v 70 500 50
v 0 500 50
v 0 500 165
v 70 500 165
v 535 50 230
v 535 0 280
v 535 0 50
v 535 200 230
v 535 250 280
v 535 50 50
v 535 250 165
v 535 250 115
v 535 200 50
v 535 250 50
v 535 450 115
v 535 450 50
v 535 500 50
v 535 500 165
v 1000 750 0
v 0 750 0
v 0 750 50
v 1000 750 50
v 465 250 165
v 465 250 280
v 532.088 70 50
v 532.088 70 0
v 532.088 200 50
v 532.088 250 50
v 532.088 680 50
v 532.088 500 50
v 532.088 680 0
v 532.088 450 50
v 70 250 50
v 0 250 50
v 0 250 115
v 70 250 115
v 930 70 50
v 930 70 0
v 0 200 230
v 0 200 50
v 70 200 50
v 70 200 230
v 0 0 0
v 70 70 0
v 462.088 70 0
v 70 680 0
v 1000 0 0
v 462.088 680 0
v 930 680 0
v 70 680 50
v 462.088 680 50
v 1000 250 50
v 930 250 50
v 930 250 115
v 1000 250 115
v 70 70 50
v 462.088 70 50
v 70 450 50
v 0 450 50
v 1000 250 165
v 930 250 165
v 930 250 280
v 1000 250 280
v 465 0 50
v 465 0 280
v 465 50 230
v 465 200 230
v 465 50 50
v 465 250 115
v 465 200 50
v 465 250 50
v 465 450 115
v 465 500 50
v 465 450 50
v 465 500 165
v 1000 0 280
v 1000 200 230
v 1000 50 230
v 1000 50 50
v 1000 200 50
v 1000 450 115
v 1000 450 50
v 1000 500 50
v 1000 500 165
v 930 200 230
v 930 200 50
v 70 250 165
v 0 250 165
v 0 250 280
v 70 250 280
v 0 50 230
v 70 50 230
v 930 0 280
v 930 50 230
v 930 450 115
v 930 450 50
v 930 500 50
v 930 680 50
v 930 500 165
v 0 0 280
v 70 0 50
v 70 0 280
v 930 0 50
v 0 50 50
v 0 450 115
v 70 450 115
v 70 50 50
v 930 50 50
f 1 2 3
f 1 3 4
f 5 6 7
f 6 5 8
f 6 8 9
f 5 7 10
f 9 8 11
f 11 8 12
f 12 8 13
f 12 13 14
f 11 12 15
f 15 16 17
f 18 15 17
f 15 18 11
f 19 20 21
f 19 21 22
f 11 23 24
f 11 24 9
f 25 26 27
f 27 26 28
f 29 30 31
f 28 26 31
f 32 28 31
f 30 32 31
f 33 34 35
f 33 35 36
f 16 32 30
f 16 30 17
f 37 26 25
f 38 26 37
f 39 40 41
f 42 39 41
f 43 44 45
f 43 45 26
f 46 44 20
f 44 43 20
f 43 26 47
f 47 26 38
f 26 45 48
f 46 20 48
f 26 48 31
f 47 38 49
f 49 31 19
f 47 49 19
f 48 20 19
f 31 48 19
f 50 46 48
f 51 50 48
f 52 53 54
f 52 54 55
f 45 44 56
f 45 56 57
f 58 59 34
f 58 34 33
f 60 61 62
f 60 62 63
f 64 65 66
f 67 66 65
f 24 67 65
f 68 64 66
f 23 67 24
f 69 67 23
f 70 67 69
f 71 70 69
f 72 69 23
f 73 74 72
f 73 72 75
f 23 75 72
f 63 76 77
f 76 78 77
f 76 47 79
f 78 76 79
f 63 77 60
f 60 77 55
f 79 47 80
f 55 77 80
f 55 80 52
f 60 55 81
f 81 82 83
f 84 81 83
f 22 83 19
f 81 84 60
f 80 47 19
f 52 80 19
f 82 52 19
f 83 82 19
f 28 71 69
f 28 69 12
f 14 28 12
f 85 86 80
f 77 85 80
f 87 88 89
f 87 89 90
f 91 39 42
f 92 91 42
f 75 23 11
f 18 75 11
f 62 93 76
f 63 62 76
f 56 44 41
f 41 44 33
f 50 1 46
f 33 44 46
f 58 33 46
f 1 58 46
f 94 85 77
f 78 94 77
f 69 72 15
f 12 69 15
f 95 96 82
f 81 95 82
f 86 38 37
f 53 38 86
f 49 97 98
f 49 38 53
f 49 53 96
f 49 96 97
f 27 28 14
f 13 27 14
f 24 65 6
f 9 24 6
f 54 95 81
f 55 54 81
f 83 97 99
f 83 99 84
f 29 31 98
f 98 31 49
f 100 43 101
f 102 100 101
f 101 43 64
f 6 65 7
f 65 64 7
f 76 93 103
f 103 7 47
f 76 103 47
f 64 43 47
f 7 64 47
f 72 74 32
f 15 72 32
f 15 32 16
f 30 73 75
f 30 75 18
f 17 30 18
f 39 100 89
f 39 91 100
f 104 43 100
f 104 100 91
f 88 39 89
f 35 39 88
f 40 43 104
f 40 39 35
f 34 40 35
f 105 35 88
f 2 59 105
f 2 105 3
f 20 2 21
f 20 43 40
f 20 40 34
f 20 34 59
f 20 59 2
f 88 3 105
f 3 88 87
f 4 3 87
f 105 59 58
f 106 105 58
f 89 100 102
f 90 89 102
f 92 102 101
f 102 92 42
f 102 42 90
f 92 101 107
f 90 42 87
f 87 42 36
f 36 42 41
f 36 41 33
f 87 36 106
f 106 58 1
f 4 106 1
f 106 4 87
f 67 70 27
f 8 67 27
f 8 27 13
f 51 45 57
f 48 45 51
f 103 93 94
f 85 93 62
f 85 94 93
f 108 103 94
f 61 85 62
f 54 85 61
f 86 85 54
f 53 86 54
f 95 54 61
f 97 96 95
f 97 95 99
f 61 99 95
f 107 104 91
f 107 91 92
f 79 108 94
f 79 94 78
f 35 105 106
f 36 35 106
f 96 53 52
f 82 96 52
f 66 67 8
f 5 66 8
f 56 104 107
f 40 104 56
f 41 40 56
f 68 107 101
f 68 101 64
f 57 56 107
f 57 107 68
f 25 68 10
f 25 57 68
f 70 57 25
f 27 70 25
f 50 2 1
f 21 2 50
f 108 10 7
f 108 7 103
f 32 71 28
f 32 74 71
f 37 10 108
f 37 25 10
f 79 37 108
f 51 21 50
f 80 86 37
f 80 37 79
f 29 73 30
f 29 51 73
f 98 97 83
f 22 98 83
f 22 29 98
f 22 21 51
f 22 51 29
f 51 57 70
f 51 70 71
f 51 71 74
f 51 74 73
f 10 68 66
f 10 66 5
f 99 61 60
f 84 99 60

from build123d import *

# Parameters (mm, degrees)
SKETCH_W                   = 1000
SKETCH_H                   = 750
SKETCH_W_2                 = 392.088353
SKETCH_H_2                 = 610
SKETCH_W_3                 = 397.911647
PAD_DEPTH                  = 50
SKETCH001_W                = 70
SKETCH001_H                = 50
PAD001_DEPTH               = 180
SKETCH001_MIRRORED001_2_W  = 70
SKETCH001_MIRRORED001_2_H  = 50
PAD001_MIRRORED001_2_DEPTH = 180
LINEARPATTERN_COUNT        = 3
LINEARPATTERN_PITCH        = 465
SKETCH002_W                = 70
SKETCH002_H                = 50
PAD002_DEPTH               = 65
SKETCH003_W                = 70
SKETCH003_H                = 250
PAD003_DEPTH               = 50
LINEARPATTERN001_COUNT     = 3
LINEARPATTERN001_PITCH     = 465
LINEARPATTERN002_COUNT     = 3
LINEARPATTERN002_PITCH     = 465
SKETCH004_W                = 70
SKETCH004_H                = 250
PAD004_DEPTH               = 50
LINEARPATTERN003_COUNT     = 3
LINEARPATTERN003_PITCH     = 465


with BuildPart() as part:
    # Sketch → Pad (new body)
    with BuildSketch(Plane.XY):
        with Locations((500, 375)):
            Rectangle(SKETCH_W, SKETCH_H)
        with Locations((266.044176, 375)):
            Rectangle(SKETCH_W_2, SKETCH_H_2, mode=Mode.SUBTRACT)
        with Locations((731.044177, 375)):
            Rectangle(SKETCH_W_3, SKETCH_H_2, mode=Mode.SUBTRACT)
    extrude(amount=PAD_DEPTH)

    # Sketch001 → Pad001 (join)
    with BuildSketch(Plane.XY.offset(50)):
        with Locations((35, 25)):
            Rectangle(SKETCH001_W, SKETCH001_H)
    pad001 = extrude(amount=PAD001_DEPTH)

    # Sketch001 Mirrored001 2 → Pad001 Mirrored001 2 (add)
    with BuildSketch(Plane(origin=(0, 250, 50), x_dir=(1, 0, 0), z_dir=(0, 0, -1))):
        with Locations((35, 25)):
            Rectangle(SKETCH001_MIRRORED001_2_W, SKETCH001_MIRRORED001_2_H)
    pad001_mirrored001_2 = extrude(amount=-PAD001_MIRRORED001_2_DEPTH)

    # LinearPattern: Pad001, Pad001 Mirrored001 2 ×3
    with Locations(*[(i * LINEARPATTERN_PITCH, 0, 0) for i in range(1, LINEARPATTERN_COUNT)]):
        add(pad001)
        add(pad001_mirrored001_2)

    # Sketch002 → Pad002 (join)
    with BuildSketch(Plane.XY.offset(50)):
        with Locations((35, 475)):
            Rectangle(SKETCH002_W, SKETCH002_H)
    pad002 = extrude(amount=PAD002_DEPTH)

    # Sketch003 (on DatumPlane) → Pad003 (join)
    with BuildSketch(Plane.XY.offset(230)):
        with Locations((35, 125)):
            Rectangle(SKETCH003_W, SKETCH003_H)
    pad003 = extrude(amount=PAD003_DEPTH)

    # LinearPattern001: Pad002 ×3
    with Locations(*[(i * LINEARPATTERN001_PITCH, 0, 0) for i in range(1, LINEARPATTERN001_COUNT)]):
        add(pad002)

    # LinearPattern002: Pad003 ×3
    with Locations(*[(i * LINEARPATTERN002_PITCH, 0, 0) for i in range(1, LINEARPATTERN002_COUNT)]):
        add(pad003)

    # Sketch004 (on DatumPlane) → Pad004 (join)
    with BuildSketch(Plane.XY.offset(115)):
        with Locations((35, 375)):
            Rectangle(SKETCH004_W, SKETCH004_H)
    pad004 = extrude(amount=PAD004_DEPTH)

    # LinearPattern003: Pad004 ×3
    with Locations(*[(i * LINEARPATTERN003_PITCH, 0, 0) for i in range(1, LINEARPATTERN003_COUNT)]):
        add(pad004)


solid = part.part
